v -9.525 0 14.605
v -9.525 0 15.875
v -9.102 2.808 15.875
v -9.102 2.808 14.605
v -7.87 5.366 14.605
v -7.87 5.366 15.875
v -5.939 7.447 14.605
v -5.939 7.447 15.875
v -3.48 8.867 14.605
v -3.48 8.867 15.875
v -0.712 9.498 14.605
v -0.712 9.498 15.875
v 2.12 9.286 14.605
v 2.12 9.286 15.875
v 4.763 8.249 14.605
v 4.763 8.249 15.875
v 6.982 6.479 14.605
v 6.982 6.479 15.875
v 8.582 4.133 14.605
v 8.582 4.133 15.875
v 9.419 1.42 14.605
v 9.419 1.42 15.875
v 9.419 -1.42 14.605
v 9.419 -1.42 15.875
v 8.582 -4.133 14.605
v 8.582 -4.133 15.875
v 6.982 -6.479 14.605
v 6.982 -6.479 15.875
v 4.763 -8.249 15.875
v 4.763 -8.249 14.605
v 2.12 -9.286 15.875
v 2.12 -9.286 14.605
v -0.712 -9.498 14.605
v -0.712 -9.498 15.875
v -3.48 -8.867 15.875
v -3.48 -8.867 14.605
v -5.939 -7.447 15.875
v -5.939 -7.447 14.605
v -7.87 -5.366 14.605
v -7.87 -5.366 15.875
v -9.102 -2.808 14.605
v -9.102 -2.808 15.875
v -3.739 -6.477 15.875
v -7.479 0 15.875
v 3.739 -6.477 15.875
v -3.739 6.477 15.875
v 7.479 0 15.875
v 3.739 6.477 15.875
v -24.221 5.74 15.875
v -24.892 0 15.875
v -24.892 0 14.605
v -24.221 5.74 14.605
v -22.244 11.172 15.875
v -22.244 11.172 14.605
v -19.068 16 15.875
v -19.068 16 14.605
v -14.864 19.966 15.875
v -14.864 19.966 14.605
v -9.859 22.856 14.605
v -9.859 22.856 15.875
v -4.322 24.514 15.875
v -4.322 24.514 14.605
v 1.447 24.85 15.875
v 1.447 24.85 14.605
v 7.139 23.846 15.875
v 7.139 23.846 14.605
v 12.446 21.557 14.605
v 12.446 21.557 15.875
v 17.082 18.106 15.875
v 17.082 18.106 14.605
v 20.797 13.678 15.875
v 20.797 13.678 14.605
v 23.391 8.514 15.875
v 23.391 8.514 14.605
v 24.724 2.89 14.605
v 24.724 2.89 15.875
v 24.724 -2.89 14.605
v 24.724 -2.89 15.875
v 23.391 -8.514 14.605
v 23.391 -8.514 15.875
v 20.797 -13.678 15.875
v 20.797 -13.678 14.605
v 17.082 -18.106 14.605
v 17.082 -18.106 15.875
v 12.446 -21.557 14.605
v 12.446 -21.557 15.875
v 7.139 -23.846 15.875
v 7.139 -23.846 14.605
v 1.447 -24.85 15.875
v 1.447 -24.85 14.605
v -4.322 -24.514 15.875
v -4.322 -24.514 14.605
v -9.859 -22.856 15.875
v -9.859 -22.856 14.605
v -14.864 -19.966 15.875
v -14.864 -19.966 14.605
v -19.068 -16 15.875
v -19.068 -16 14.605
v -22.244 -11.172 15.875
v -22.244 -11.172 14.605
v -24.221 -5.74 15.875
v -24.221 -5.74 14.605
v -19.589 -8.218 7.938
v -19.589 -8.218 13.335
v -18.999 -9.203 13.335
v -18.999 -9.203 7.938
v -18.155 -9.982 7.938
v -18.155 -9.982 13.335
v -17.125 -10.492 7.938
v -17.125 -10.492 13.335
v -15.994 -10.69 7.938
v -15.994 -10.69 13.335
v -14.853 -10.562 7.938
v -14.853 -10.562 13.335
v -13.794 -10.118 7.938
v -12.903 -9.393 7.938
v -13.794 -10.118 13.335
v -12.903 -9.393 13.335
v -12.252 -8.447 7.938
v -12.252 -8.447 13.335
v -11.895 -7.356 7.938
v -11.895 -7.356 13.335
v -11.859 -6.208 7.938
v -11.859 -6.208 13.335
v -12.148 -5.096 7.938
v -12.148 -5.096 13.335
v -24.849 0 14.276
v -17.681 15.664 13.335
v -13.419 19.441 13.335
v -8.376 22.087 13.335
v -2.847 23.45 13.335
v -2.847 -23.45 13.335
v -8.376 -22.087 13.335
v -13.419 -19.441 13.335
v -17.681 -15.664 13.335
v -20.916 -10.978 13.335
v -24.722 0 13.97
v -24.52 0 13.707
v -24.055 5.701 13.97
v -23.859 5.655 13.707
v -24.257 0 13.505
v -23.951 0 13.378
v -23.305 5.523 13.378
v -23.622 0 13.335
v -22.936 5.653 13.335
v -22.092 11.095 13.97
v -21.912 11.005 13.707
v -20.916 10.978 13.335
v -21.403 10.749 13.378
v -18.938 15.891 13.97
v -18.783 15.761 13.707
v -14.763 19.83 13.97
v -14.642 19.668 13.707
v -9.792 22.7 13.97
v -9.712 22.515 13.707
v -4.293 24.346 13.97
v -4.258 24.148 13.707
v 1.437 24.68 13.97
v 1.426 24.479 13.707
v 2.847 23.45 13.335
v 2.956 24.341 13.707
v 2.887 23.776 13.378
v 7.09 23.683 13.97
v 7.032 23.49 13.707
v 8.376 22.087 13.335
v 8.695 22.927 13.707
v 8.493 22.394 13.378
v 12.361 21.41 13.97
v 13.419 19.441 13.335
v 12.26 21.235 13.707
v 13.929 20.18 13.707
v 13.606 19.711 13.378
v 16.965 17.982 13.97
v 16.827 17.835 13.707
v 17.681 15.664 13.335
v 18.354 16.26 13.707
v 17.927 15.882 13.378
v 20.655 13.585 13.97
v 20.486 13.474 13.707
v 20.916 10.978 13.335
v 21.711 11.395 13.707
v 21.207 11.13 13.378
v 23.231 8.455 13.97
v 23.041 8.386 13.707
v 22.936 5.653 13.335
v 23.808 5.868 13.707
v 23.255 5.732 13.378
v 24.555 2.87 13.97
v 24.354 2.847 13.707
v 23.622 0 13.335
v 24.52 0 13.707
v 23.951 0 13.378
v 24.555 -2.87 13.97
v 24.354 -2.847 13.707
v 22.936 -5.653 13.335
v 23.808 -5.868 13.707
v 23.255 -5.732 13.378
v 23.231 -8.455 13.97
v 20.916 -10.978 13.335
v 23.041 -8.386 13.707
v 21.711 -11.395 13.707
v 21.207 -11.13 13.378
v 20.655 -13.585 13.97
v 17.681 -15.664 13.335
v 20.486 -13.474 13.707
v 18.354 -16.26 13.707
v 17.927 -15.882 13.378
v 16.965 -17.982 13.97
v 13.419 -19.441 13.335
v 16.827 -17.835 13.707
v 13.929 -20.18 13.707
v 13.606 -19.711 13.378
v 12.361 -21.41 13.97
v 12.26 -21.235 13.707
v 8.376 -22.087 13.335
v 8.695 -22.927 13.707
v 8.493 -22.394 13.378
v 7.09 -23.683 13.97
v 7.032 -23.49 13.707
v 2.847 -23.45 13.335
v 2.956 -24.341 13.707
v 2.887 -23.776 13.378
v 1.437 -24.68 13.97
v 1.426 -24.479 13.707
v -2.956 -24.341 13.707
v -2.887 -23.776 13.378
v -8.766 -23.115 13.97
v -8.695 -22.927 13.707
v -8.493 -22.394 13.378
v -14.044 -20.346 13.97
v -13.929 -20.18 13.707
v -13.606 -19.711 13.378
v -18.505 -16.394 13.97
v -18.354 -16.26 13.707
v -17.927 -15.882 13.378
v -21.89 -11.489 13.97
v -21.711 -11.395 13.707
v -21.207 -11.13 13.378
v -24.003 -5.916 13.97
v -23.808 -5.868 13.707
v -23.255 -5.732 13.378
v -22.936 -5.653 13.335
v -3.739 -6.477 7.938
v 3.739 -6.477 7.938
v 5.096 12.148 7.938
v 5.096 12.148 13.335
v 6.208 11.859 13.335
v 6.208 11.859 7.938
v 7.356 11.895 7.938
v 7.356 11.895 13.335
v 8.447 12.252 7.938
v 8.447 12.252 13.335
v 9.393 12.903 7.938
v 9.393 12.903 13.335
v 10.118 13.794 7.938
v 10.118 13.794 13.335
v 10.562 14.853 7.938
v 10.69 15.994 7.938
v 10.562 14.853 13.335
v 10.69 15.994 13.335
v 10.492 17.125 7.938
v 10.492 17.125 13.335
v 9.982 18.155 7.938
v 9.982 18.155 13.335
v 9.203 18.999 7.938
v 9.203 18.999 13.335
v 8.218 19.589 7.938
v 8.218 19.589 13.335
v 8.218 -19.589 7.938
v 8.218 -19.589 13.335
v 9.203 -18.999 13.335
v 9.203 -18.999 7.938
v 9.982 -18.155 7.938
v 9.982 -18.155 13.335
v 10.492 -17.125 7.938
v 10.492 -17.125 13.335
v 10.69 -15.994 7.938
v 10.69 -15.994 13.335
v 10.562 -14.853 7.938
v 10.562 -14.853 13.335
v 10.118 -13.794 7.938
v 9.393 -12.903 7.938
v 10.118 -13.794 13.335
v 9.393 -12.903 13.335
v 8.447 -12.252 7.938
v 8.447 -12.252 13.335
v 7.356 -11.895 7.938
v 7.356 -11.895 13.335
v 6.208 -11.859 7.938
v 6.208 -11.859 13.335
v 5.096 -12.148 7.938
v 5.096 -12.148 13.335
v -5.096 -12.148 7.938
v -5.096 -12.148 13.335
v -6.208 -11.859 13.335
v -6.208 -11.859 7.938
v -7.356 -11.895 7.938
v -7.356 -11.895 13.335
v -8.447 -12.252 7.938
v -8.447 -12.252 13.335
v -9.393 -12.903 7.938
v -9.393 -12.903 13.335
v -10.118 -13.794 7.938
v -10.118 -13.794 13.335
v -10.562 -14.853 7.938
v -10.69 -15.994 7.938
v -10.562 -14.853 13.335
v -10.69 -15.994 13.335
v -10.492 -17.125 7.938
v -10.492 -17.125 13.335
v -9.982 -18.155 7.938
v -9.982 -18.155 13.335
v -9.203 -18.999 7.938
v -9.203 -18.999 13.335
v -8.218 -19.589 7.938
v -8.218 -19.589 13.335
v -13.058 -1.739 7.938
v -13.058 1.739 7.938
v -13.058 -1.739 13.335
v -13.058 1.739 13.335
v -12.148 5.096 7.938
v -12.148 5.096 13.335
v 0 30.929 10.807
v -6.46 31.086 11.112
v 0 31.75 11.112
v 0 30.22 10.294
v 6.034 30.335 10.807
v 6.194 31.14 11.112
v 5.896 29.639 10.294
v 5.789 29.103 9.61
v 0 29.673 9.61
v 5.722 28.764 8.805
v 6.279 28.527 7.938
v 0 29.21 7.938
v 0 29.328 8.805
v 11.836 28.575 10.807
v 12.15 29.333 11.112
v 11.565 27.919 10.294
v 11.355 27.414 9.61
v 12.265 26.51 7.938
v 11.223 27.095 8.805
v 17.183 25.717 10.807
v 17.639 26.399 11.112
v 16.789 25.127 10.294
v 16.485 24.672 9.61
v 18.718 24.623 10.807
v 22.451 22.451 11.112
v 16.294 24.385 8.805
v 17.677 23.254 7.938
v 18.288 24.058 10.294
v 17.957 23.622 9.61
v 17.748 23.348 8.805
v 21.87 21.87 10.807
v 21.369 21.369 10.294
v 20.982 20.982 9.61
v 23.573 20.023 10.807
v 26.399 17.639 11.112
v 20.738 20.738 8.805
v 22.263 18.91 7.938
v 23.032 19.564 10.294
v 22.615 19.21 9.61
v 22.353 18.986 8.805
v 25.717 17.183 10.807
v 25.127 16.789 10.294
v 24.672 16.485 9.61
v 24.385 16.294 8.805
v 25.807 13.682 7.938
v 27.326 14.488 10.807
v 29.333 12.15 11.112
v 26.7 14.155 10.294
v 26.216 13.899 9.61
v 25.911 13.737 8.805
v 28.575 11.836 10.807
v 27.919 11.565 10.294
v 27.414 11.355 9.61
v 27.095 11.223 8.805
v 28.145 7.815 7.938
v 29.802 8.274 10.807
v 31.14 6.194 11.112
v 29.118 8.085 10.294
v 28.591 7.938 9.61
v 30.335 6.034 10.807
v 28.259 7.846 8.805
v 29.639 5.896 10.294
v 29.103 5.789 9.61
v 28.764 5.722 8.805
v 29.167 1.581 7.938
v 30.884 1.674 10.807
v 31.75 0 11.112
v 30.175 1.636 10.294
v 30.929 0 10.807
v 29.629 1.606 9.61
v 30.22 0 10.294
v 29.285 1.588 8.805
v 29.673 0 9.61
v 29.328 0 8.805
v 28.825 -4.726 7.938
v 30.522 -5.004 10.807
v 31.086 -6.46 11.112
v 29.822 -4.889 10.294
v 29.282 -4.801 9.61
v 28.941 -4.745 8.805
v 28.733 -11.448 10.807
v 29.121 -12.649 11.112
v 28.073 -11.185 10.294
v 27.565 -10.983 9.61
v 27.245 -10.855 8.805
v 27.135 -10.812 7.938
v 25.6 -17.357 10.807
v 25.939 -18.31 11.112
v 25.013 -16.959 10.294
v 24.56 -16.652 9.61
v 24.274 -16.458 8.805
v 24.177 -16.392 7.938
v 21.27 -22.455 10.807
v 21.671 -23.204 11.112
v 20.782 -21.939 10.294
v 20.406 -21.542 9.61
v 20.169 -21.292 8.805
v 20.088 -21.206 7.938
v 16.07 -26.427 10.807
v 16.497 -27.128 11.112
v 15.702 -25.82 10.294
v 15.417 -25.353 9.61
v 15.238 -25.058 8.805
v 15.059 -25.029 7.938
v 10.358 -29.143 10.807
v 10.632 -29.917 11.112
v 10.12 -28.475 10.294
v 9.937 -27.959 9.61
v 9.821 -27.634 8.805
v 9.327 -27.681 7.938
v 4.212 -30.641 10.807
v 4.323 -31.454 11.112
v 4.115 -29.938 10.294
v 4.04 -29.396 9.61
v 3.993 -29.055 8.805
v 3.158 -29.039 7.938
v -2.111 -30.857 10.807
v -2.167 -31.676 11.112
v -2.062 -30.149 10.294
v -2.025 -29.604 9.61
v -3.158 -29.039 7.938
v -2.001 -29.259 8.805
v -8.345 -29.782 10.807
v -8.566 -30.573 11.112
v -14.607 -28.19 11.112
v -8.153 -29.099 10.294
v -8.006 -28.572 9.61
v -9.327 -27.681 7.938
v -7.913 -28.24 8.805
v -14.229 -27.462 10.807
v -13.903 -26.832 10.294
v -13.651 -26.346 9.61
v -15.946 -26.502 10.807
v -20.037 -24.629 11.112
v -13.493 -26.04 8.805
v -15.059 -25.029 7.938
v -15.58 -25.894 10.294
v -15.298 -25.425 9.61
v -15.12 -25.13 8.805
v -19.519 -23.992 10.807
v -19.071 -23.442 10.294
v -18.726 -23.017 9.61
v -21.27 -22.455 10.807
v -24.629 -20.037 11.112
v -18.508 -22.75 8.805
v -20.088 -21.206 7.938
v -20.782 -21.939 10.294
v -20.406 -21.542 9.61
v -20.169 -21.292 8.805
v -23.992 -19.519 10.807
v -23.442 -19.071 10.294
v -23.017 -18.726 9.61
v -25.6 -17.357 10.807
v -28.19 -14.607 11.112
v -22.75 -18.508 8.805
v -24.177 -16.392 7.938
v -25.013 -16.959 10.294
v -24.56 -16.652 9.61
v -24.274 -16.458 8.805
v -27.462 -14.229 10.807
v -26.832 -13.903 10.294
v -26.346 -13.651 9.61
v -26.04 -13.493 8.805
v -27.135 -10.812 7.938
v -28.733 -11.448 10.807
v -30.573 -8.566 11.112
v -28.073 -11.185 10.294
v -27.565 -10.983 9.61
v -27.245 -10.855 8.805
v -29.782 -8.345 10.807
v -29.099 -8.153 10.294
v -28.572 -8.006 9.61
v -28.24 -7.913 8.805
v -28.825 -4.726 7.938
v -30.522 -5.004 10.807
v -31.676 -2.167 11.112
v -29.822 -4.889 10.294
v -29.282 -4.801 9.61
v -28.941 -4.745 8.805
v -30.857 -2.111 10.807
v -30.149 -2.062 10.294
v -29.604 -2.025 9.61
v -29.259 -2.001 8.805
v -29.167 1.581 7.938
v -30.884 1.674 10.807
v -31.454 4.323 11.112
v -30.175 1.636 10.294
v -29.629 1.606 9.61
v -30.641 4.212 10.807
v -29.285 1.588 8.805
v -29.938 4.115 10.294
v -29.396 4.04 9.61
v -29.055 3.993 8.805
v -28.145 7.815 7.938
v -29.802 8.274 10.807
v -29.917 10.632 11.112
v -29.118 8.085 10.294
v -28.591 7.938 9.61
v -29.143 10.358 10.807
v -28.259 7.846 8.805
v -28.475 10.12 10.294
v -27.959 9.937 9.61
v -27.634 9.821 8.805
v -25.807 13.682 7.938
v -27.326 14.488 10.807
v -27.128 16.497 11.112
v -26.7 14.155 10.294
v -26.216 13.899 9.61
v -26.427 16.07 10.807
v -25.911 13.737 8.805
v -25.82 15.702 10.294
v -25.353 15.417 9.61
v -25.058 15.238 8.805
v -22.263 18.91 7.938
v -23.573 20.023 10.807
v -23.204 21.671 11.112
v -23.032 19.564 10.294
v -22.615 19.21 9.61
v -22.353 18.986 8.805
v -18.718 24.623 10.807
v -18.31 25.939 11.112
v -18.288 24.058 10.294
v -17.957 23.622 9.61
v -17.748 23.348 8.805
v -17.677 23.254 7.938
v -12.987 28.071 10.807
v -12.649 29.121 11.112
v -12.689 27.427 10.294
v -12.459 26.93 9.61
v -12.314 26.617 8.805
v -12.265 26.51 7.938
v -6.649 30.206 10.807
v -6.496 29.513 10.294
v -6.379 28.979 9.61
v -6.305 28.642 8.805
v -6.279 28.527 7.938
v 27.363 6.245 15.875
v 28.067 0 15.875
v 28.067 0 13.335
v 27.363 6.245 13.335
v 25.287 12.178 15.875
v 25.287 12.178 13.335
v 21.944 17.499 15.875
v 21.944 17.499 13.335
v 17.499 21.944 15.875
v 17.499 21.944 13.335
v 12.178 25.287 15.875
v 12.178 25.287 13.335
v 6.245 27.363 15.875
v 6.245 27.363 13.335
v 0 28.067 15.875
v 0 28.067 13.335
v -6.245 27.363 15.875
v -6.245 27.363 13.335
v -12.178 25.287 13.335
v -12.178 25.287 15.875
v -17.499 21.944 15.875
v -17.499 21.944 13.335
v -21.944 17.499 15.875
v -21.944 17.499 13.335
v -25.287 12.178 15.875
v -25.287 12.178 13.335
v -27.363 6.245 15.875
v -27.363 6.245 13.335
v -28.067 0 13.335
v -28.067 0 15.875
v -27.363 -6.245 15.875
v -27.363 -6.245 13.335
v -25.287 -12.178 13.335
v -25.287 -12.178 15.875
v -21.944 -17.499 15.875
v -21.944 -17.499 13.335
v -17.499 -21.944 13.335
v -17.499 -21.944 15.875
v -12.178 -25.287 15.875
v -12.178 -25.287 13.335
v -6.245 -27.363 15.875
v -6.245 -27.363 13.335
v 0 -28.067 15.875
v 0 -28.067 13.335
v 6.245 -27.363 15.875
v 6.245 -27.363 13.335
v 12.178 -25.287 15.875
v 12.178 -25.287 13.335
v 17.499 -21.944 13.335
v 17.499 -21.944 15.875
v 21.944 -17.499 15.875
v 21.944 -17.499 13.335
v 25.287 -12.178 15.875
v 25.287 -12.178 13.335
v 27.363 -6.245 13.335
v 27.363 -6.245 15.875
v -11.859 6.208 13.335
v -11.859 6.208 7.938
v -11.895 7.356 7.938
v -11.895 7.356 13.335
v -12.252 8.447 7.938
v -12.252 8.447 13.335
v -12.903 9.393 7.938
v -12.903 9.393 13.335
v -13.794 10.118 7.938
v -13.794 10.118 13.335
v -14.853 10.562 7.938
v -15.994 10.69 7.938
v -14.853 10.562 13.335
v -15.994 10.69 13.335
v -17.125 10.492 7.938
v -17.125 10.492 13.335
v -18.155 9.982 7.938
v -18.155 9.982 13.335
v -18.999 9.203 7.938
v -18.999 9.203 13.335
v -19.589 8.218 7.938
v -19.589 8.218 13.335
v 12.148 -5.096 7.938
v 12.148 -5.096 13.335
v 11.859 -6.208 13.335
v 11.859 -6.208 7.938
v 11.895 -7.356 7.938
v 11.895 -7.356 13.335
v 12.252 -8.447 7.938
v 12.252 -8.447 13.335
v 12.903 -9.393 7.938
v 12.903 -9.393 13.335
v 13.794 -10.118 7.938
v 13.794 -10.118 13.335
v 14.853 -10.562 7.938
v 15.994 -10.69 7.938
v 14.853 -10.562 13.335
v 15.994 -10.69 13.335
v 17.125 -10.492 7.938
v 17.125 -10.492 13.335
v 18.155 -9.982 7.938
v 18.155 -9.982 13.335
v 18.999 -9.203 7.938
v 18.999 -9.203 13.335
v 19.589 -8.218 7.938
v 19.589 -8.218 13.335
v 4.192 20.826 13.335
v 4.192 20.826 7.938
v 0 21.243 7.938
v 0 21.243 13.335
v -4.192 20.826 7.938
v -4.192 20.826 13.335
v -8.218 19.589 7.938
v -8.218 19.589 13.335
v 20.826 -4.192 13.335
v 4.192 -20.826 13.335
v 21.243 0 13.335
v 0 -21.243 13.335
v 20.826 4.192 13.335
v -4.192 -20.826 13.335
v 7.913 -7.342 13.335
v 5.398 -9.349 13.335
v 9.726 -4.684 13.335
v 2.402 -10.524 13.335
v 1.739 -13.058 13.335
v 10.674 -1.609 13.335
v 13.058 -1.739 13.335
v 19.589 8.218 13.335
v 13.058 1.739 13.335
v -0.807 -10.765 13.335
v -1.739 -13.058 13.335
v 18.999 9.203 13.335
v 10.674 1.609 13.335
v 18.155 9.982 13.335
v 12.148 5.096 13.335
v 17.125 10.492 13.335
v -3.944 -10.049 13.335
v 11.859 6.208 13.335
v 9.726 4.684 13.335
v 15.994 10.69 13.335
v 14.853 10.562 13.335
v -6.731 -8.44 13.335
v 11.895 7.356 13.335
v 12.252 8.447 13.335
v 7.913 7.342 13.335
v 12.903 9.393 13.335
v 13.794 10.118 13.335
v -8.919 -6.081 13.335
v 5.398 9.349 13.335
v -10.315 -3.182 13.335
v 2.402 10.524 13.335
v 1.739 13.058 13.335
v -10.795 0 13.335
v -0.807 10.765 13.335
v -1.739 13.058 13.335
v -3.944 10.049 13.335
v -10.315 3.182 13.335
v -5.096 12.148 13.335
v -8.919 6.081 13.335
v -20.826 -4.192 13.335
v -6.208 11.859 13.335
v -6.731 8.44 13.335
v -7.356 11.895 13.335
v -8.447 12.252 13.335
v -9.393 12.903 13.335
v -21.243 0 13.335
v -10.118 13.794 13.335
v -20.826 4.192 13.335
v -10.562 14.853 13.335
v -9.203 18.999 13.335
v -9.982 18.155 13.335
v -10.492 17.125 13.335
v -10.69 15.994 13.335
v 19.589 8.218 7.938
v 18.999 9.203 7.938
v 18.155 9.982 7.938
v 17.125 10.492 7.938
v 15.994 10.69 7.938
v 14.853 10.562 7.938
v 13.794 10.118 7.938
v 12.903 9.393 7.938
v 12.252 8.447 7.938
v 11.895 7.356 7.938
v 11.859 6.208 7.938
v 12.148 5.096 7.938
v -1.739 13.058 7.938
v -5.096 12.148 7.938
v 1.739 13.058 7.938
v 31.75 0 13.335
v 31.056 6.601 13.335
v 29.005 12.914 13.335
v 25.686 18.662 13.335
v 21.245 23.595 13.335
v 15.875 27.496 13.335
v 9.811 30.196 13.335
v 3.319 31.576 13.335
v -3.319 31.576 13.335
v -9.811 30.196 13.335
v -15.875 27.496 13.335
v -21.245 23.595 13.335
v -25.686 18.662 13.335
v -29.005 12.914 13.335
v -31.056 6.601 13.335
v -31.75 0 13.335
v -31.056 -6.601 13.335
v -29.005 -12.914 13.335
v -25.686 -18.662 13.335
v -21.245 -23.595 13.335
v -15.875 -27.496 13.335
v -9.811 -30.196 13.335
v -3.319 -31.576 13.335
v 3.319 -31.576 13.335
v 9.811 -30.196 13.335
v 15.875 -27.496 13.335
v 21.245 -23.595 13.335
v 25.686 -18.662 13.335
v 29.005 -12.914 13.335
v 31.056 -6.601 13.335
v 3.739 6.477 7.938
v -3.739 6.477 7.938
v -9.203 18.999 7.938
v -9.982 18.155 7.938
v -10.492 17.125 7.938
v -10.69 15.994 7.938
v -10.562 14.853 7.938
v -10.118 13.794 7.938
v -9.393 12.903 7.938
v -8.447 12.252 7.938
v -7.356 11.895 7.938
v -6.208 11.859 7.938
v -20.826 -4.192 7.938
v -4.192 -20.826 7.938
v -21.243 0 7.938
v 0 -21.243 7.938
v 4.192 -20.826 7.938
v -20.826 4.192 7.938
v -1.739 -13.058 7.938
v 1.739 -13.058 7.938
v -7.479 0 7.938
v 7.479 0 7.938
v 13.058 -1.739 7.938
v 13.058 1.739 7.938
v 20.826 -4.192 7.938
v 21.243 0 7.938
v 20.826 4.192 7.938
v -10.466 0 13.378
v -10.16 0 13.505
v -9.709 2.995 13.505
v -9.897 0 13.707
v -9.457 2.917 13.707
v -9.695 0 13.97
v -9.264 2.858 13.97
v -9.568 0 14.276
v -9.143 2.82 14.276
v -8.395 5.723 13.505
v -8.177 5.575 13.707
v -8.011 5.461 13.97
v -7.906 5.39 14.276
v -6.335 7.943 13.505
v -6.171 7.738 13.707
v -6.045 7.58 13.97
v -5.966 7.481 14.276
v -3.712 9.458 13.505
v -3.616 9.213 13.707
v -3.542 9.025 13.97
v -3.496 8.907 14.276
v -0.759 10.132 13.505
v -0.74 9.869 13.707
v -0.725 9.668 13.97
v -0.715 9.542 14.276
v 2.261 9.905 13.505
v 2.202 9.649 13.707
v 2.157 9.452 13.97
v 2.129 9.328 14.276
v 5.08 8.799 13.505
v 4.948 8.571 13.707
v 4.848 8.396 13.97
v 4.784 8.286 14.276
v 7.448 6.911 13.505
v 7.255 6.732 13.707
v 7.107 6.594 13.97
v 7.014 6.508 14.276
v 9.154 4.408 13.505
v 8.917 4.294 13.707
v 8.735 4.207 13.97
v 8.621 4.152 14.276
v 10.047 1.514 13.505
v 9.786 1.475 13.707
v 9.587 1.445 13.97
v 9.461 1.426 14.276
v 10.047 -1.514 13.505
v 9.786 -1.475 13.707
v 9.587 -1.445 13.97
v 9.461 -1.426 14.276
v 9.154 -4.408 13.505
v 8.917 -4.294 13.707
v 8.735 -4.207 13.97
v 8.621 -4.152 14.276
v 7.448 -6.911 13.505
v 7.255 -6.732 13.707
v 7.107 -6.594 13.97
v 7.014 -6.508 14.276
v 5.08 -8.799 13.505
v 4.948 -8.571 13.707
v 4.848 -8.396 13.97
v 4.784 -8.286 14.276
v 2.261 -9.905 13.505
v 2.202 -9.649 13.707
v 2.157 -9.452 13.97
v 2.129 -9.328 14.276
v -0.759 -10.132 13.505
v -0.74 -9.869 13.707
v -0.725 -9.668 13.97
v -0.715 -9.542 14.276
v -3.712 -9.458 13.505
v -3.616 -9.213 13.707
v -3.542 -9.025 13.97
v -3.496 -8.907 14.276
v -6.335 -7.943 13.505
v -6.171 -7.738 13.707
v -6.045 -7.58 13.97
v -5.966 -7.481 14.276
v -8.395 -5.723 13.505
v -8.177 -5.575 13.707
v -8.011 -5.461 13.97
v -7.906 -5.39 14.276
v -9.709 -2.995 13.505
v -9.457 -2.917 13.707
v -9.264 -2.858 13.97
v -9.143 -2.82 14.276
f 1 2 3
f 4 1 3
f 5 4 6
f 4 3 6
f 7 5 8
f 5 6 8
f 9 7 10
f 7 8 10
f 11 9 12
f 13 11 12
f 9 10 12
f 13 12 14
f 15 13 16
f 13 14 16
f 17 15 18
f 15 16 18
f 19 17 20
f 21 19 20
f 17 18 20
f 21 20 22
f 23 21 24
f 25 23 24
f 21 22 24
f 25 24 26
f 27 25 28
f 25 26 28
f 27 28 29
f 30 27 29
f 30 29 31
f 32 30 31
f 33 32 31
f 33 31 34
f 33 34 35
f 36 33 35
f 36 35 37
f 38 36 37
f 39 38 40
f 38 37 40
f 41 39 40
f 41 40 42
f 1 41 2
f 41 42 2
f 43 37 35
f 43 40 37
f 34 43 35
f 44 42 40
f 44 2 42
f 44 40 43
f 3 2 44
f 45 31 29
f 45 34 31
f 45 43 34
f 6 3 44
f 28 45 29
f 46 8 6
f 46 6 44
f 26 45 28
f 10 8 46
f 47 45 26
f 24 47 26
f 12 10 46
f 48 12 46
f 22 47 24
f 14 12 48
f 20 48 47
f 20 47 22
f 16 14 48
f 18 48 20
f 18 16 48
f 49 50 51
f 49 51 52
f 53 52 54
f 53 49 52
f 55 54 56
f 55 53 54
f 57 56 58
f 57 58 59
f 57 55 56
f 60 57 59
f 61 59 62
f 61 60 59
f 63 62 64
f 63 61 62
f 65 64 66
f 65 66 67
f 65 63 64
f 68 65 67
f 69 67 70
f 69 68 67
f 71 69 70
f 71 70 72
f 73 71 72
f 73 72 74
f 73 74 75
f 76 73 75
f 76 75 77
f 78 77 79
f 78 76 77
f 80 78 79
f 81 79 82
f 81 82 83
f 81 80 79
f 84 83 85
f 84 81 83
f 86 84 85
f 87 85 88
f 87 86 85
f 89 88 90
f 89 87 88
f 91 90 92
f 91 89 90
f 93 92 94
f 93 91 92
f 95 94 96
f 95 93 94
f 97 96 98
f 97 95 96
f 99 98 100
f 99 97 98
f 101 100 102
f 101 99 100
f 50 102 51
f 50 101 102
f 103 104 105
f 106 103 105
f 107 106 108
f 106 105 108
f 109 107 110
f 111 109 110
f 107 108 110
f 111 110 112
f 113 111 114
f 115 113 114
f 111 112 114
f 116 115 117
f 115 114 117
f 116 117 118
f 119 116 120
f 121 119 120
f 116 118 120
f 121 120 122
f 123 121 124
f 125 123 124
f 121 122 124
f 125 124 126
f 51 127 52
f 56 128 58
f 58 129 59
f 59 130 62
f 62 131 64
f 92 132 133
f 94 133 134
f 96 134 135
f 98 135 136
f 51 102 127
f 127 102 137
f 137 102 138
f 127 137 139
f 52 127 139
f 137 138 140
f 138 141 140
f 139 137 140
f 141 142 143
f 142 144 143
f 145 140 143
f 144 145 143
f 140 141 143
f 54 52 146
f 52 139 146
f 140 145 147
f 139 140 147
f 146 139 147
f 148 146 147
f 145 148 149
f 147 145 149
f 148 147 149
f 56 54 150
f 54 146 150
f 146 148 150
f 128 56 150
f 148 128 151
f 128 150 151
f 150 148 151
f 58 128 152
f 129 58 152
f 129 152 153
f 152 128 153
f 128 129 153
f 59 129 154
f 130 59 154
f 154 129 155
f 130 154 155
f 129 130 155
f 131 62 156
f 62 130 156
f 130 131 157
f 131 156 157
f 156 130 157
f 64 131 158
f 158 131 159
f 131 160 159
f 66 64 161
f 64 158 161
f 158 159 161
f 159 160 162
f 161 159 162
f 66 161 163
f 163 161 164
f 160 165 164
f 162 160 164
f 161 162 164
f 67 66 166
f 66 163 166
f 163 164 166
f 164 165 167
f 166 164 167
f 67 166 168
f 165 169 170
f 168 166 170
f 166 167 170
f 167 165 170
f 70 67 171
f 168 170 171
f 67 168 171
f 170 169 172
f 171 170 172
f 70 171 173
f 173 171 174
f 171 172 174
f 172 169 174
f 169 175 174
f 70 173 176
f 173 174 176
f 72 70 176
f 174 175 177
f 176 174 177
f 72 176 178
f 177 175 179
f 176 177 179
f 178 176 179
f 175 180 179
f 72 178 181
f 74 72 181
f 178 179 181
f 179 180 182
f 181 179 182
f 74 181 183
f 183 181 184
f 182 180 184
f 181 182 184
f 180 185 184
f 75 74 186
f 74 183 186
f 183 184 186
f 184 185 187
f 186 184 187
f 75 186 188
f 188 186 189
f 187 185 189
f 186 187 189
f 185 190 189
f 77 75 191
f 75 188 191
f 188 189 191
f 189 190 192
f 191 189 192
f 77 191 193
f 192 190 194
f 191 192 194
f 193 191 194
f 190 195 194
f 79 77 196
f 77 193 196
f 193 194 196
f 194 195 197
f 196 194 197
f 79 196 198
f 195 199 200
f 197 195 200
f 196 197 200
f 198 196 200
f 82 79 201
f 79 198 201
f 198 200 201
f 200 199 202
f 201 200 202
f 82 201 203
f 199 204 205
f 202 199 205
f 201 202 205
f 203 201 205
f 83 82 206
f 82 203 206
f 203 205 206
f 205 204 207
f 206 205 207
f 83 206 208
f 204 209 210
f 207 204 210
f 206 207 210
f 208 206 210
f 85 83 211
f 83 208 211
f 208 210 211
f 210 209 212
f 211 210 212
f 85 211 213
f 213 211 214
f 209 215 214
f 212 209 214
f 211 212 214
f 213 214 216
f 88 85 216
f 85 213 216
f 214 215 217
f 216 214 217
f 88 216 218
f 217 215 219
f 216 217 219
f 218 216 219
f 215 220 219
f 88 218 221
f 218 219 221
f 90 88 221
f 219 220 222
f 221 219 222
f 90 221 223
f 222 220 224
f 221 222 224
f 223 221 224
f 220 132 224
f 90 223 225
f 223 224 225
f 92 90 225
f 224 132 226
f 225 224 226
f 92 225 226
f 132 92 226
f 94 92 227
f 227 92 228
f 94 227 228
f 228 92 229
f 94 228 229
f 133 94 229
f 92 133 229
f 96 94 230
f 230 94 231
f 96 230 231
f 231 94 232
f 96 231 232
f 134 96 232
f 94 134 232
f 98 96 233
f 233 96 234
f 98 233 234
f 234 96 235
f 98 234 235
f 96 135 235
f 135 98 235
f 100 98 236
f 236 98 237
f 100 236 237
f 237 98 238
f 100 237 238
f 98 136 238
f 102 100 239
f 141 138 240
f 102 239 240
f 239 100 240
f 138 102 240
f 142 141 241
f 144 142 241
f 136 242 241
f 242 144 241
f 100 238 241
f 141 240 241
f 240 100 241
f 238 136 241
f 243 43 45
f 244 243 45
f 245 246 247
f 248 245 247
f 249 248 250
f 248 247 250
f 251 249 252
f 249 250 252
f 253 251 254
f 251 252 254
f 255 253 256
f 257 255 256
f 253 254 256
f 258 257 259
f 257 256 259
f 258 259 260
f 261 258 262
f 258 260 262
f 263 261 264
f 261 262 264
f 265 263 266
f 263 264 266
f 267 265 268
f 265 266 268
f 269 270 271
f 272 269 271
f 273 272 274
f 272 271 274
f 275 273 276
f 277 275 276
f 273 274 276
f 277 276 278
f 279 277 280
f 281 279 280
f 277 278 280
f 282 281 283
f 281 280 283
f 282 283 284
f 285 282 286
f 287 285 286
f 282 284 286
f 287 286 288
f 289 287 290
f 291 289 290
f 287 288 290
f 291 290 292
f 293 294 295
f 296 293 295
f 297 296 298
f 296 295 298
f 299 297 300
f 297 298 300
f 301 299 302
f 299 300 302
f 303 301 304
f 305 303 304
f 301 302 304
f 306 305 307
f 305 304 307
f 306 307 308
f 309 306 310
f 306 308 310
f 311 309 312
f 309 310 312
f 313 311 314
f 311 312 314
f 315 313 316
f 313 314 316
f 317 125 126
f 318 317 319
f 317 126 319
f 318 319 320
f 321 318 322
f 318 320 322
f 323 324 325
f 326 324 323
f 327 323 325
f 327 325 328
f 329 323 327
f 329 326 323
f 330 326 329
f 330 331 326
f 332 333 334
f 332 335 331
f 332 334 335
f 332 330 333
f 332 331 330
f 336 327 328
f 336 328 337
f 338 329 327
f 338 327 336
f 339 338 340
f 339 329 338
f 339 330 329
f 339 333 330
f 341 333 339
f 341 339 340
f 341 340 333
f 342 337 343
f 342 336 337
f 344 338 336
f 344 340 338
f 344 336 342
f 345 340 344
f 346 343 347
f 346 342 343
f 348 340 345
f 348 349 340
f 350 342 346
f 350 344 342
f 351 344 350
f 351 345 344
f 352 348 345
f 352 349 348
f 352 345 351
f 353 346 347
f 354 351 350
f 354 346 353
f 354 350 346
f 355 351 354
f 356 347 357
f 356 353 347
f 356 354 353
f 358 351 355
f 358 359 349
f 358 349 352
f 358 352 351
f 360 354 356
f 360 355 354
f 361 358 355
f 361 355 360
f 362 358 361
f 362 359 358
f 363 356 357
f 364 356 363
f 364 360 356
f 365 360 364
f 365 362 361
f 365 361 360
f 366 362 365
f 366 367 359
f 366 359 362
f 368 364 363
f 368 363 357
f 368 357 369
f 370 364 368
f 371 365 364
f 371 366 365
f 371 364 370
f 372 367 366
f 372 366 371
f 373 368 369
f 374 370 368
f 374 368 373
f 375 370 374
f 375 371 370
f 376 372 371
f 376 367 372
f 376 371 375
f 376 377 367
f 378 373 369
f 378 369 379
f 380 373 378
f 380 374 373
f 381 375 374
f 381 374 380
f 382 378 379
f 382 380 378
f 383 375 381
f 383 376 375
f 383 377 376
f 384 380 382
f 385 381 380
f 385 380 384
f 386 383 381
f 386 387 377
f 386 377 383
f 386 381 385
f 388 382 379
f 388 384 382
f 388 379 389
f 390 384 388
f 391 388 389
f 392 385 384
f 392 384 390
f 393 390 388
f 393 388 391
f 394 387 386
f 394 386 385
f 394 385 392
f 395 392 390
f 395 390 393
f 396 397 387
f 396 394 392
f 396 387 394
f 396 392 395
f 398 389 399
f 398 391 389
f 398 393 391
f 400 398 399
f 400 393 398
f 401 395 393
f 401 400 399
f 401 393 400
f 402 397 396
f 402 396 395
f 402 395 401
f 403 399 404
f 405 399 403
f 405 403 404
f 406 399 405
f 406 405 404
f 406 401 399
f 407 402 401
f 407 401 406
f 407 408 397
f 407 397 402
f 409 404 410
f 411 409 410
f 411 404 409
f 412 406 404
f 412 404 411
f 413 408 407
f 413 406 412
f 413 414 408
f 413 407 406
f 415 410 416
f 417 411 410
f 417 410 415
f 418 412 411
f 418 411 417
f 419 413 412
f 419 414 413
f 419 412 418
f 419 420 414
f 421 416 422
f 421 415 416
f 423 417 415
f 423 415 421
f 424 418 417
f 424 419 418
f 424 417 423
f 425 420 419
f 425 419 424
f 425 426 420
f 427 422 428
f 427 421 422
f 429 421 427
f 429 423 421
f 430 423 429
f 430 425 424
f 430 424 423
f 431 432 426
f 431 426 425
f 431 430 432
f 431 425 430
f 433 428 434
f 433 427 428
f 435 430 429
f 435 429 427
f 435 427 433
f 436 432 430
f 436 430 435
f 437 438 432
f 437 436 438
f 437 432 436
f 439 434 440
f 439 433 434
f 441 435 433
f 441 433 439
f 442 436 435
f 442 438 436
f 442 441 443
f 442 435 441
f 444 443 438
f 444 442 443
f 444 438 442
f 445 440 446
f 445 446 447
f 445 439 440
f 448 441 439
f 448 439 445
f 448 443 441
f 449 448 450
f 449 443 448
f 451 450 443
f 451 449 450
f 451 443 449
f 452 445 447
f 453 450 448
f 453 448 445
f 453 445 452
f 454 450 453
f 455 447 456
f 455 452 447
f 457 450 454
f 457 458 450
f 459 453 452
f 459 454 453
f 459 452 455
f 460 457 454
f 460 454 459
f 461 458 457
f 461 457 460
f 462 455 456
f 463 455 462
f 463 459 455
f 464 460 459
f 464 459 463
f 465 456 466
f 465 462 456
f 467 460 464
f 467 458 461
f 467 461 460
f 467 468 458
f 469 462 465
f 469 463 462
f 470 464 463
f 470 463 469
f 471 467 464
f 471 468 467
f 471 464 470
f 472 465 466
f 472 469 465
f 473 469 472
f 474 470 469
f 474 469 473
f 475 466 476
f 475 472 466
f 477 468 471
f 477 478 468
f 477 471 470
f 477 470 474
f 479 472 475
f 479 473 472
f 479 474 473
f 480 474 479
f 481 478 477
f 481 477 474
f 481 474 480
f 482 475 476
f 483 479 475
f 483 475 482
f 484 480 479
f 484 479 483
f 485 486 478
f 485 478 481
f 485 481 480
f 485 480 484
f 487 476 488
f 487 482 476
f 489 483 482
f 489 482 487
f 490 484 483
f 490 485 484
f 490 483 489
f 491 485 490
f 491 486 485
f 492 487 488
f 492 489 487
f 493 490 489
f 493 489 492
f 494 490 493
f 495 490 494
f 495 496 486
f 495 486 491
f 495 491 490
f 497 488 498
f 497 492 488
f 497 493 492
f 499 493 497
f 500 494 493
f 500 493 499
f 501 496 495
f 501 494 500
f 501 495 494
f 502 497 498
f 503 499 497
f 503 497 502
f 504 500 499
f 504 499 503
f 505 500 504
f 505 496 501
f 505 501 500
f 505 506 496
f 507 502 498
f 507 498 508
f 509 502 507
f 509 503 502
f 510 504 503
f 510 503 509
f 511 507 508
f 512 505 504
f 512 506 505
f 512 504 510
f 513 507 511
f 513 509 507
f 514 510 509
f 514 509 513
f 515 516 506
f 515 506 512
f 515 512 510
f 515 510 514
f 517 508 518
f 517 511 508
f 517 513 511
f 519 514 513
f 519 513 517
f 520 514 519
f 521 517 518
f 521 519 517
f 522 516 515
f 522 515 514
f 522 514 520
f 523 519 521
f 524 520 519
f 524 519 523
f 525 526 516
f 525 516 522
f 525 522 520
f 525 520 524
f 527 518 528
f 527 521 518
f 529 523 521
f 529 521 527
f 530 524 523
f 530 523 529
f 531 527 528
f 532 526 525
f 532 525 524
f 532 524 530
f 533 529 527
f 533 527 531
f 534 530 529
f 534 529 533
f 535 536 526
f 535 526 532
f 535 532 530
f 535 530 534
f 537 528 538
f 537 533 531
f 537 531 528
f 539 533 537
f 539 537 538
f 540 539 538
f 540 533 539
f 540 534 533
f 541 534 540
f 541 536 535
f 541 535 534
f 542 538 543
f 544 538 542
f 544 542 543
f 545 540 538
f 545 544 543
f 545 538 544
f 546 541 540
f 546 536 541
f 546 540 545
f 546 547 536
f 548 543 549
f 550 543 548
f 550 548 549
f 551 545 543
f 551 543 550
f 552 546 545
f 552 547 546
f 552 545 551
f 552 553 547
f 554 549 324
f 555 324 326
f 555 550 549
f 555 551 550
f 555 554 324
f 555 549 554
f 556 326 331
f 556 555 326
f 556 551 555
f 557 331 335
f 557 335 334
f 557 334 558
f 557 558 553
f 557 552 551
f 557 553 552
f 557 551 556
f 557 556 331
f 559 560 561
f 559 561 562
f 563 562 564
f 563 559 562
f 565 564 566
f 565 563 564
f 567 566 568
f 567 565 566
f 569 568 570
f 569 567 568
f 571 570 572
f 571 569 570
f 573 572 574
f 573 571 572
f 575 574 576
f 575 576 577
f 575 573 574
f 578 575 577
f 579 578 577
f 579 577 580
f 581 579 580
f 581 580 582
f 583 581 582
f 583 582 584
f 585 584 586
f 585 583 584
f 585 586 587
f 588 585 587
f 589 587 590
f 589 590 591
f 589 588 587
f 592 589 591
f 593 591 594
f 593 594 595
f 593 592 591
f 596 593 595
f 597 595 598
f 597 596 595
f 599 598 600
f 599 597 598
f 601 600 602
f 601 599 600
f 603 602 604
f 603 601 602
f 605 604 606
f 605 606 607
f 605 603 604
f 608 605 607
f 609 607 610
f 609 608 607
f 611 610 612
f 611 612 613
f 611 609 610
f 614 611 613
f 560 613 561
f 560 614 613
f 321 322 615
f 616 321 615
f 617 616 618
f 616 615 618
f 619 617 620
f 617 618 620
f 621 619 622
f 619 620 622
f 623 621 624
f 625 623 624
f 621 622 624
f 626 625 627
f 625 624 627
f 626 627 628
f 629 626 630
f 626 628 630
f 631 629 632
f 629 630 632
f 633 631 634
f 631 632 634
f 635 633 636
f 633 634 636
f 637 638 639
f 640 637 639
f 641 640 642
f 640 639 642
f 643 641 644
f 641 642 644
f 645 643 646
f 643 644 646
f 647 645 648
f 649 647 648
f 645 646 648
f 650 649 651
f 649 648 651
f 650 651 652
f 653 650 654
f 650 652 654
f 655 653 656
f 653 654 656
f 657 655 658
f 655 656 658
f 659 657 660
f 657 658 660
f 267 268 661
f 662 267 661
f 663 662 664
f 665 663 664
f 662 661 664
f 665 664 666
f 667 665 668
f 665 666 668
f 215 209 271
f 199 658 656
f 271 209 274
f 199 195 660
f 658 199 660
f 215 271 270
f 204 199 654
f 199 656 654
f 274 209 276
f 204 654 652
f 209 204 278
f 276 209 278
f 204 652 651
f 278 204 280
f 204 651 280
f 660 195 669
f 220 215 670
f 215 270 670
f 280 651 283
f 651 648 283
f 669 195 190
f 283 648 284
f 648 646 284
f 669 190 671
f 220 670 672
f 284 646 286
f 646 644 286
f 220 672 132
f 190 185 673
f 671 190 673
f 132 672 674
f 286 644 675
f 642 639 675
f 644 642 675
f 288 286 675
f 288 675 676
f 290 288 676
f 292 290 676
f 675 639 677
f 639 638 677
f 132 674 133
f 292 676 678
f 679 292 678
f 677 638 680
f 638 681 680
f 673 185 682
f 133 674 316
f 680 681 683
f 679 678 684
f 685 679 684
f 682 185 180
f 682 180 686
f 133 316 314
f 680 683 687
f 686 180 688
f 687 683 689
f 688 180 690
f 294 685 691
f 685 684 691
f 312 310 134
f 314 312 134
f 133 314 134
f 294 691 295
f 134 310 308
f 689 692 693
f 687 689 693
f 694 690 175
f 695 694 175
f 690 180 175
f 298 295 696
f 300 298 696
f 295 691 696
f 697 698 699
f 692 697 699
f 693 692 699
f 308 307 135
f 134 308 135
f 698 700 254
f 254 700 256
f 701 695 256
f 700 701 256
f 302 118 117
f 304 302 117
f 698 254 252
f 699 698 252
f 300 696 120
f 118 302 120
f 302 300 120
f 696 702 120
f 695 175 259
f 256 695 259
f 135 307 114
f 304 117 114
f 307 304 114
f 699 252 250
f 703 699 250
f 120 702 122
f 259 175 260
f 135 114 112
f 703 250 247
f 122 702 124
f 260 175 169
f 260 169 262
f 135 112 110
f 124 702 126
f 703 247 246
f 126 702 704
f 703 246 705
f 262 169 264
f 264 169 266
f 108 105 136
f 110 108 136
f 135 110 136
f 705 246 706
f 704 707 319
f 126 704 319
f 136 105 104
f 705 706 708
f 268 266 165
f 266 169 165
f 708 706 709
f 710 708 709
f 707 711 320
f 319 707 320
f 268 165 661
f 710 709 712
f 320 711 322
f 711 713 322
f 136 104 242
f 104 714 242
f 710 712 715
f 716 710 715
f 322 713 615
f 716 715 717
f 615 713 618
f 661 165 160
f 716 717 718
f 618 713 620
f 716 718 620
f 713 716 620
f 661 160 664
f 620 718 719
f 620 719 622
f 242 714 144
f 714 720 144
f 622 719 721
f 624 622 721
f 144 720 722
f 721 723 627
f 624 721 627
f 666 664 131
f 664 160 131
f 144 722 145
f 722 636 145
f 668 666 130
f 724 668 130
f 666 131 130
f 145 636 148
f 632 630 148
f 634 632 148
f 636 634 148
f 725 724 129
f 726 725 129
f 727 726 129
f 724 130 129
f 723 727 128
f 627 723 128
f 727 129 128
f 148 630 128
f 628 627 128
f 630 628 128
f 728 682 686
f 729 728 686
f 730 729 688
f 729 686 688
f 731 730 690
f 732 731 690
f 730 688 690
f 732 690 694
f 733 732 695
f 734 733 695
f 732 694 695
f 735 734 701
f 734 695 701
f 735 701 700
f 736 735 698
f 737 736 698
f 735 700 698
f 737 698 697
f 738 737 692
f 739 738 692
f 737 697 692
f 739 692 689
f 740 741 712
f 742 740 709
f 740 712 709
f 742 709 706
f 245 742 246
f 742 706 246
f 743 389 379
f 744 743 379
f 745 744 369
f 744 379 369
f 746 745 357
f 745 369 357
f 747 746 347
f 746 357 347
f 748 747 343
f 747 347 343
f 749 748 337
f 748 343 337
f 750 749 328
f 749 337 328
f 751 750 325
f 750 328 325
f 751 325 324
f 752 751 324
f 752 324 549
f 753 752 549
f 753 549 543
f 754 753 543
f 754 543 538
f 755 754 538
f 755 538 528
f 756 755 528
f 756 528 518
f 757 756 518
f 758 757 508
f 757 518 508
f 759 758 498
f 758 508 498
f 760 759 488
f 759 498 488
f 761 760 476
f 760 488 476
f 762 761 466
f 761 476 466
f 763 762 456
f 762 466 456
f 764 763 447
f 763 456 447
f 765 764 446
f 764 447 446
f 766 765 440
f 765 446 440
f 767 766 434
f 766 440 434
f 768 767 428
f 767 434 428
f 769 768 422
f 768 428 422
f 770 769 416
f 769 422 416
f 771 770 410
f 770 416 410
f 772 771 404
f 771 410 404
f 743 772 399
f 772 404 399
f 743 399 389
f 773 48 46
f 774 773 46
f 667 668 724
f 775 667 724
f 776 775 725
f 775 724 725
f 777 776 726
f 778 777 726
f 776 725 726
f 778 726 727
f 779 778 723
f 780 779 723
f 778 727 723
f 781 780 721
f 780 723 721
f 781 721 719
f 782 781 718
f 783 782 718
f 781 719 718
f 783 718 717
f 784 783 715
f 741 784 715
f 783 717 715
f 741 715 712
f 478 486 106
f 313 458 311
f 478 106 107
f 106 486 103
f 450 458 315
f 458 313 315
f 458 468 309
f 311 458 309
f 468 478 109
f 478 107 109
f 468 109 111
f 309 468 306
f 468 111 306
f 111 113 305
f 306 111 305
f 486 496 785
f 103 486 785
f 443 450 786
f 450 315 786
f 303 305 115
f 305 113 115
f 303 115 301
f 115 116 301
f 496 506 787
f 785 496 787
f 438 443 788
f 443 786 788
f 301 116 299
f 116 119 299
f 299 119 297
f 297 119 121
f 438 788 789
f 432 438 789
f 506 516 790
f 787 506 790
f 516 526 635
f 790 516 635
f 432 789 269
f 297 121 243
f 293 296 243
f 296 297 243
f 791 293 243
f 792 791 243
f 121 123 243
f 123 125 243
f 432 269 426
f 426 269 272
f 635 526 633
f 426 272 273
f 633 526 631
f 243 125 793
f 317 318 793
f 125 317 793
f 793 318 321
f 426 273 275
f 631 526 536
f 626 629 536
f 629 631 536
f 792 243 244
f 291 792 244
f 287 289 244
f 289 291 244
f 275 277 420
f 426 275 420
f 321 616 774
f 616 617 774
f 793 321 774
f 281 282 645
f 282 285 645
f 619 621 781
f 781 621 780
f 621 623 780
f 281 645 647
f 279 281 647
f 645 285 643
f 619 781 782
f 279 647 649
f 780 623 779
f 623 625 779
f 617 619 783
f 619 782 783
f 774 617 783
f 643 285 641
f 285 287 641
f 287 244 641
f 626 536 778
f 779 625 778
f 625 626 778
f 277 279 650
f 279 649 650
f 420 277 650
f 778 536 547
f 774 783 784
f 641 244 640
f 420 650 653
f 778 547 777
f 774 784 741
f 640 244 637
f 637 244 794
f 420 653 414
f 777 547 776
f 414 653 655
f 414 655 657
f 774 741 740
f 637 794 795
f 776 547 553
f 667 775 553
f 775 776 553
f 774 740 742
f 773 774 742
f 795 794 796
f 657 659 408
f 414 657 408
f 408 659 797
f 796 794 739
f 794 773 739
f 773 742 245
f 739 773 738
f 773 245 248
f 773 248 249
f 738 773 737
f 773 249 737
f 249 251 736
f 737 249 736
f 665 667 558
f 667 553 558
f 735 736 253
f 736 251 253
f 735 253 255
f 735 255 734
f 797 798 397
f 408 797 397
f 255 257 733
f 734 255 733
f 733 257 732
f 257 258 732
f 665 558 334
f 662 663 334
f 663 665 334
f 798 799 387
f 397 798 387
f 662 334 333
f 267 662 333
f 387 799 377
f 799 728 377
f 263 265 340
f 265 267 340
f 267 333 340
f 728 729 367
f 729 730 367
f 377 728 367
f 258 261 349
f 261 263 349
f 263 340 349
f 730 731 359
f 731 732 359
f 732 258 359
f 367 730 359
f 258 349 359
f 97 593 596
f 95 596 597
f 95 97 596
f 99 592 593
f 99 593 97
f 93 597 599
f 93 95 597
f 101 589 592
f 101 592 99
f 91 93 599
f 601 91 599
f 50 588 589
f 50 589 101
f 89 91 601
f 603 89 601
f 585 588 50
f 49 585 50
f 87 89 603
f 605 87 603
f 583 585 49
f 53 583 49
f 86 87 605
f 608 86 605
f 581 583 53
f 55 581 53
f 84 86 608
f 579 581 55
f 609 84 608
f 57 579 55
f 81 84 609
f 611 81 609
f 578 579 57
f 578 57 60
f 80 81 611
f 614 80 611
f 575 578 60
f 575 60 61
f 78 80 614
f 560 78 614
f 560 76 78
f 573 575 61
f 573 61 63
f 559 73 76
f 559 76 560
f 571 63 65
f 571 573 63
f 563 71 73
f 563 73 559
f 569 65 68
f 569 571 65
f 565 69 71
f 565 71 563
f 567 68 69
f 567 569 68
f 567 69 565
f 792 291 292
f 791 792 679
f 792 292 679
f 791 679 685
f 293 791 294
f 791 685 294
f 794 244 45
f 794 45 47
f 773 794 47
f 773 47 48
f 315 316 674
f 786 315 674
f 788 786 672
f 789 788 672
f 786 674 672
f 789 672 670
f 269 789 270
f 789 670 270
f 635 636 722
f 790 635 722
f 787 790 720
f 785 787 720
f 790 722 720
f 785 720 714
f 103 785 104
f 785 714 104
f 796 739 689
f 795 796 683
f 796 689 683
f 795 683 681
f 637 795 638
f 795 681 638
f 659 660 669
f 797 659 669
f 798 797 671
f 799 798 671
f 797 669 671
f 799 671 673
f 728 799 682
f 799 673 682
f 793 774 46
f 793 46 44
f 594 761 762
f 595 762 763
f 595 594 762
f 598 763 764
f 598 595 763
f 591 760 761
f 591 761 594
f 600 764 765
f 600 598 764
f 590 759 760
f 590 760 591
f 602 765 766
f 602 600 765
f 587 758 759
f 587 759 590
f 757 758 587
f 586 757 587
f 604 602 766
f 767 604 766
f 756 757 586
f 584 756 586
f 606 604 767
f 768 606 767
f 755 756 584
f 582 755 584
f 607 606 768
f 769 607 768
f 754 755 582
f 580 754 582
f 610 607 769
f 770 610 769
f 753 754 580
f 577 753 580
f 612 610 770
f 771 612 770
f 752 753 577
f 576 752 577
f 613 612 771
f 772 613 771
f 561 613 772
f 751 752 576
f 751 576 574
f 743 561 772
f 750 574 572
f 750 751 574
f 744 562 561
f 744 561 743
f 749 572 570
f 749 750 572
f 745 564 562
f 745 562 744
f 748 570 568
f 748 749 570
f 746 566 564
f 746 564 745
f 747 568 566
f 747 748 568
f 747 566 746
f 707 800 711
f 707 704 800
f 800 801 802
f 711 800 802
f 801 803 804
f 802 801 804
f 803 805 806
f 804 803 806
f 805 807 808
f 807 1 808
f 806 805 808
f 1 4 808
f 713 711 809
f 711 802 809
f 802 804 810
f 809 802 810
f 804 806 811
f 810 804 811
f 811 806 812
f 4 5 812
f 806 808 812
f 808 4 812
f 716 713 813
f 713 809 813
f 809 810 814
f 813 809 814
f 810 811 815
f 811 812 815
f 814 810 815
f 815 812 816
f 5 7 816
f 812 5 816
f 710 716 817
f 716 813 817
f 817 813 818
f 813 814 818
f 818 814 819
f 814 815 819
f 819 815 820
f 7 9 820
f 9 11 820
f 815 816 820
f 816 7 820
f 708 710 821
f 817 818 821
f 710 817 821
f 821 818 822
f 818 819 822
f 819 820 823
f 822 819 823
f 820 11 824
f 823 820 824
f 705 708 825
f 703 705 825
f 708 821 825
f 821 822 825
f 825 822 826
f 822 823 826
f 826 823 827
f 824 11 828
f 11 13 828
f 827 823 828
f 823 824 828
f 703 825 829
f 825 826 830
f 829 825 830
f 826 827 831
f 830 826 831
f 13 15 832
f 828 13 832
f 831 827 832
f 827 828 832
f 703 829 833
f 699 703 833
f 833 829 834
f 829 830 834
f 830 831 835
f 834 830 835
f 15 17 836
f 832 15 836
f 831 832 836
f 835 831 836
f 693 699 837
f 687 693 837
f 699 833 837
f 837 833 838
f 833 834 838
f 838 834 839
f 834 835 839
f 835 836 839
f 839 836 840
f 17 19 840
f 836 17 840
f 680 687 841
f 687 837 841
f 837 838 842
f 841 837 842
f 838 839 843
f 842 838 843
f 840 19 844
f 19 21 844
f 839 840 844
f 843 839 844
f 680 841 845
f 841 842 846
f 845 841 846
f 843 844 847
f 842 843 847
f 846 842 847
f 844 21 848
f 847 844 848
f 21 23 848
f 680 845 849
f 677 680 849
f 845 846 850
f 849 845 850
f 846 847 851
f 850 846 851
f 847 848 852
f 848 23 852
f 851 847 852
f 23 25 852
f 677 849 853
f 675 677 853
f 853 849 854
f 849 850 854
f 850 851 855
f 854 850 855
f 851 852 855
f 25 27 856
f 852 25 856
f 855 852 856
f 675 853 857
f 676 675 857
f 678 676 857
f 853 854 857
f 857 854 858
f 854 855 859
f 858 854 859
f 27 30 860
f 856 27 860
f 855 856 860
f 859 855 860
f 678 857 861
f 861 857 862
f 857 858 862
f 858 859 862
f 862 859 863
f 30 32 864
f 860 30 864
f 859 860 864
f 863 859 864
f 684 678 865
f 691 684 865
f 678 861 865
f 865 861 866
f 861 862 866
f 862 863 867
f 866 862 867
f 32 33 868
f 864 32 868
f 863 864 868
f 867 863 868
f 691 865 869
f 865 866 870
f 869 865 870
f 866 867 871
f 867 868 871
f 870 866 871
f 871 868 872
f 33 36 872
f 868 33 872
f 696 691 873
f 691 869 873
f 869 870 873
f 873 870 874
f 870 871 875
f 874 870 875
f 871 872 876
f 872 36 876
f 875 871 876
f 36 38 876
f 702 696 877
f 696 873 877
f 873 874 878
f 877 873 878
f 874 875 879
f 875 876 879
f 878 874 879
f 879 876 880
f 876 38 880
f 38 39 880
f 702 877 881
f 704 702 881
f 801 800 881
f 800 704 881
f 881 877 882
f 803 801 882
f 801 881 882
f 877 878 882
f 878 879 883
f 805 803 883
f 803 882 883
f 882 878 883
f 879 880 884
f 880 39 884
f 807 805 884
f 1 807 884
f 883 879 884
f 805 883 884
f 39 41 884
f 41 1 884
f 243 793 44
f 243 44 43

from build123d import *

# Parameters (mm, degrees)
SKETCH1_R                         = 31.75
HEX_AXEL_CUTOUT_OUTSIDE_RIM_DEPTH = 15.875
SKETCH3_R                         = 31.75
SKETCH3_R_2                       = 28.067
PIPE_STEP_DEPTH                   = 2.54
SKETCH5_R                         = 24.892
SKETCH5_R_2                       = 9.525
SPOKE_STEP_DEPTH                  = 2.54
SLOTS_DEPTH                       = 14.335
FILLET1_R                         = 1.27
SKETCH7_W                         = 163.08703459
SKETCH7_H                         = 168.65885573
MIDCUT_DEPTH                      = 8.9375


with BuildPart() as part:
    # Sketch1 → Hex Axel Cutout & Outside Rim (new body)
    with BuildSketch(Plane.XY):
        Circle(SKETCH1_R)
        Polygon((-7.478995387, 0), (-3.739497694, -6.477), (3.739497694, -6.477), (7.478995387, 0), (3.739497694, 6.477), (-3.739497694, 6.477), align=None, mode=Mode.SUBTRACT)
    extrude(amount=HEX_AXEL_CUTOUT_OUTSIDE_RIM_DEPTH)

    # Sketch3 → Pipe Step (cut)
    with BuildSketch(Plane.XY.offset(15.875)):
        Circle(SKETCH3_R)
        Circle(SKETCH3_R_2, mode=Mode.SUBTRACT)
    pipe_step = extrude(amount=-PIPE_STEP_DEPTH, mode=Mode.SUBTRACT)

    # Step Mirror: Pipe Step across plane
    add(pipe_step.mirror(Plane.XY.offset(7.9375)), mode=Mode.SUBTRACT)

    # Sketch4 → Poly Cord Groove (revolve, cut)
    with BuildSketch(Plane(origin=(0, 0, 0), x_dir=(0, 0, -1), z_dir=(1, 0, 0))):
        with BuildLine():
            Line((-4.7625, 31.75), (-11.1125, 31.75))
            ThreePointArc((-11.1125, 31.75), (-7.9375, 29.21), (-4.7625, 31.75))
        make_face()
    revolve(axis=Axis((0, 0, 13.335), (0, 0, -1)), mode=Mode.SUBTRACT)

    # Sketch5 → Spoke Step (cut)
    with BuildSketch(Plane(origin=(0, 0, 0), x_dir=(-1, 0, 0), z_dir=(0, 0, -1))):
        Circle(SKETCH5_R)
        Circle(SKETCH5_R_2, mode=Mode.SUBTRACT)
    spoke_step = extrude(amount=-SPOKE_STEP_DEPTH, mode=Mode.SUBTRACT)

    # Spoke Step Mirror: Spoke Step across plane
    add(spoke_step.mirror(Plane.XY.offset(7.9375)), mode=Mode.SUBTRACT)

    # Sketch6 → Slots (cut, through all)
    with BuildSketch(Plane.XY.offset(13.335)):
        with BuildLine():
            ThreePointArc((19.589209778, -8.218410987), (21.243338223, 0), (19.589209778, 8.218410987))
            ThreePointArc((19.589209778, 8.218410987), (14.307589254, 10.378115507), (12.147884733, 5.096494983))
            ThreePointArc((12.147884733, 5.096494983), (13.173661777, 0), (12.147884733, -5.096494983))
            ThreePointArc((12.147884733, -5.096494983), (14.307589254, -10.378115507), (19.589209778, -8.218410987))
        make_face()
        with BuildLine():
            ThreePointArc((-8.218410987, -19.589209778), (0, -21.243338223), (8.218410987, -19.589209778))
            ThreePointArc((8.218410987, -19.589209778), (10.378115507, -14.307589254), (5.096494983, -12.147884733))
            ThreePointArc((5.096494983, -12.147884733), (0, -13.173661777), (-5.096494983, -12.147884733))
            ThreePointArc((-5.096494983, -12.147884733), (-10.378115507, -14.307589254), (-8.218410987, -19.589209778))
        make_face()
        with BuildLine():
            ThreePointArc((-19.589209778, 8.218410987), (-21.243338223, 0), (-19.589209778, -8.218410987))
            ThreePointArc((-19.589209778, -8.218410987), (-14.307589254, -10.378115507), (-12.147884733, -5.096494983))
            ThreePointArc((-12.147884733, -5.096494983), (-13.173661777, 0), (-12.147884733, 5.096494983))
            ThreePointArc((-12.147884733, 5.096494983), (-14.307589254, 10.378115507), (-19.589209778, 8.218410987))
        make_face()
        with BuildLine():
            ThreePointArc((8.218410987, 19.589209778), (0, 21.243338223), (-8.218410987, 19.589209778))
            ThreePointArc((-8.218410987, 19.589209778), (-10.378115507, 14.307589254), (-5.096494983, 12.147884733))
            ThreePointArc((-5.096494983, 12.147884733), (0, 13.173661777), (5.096494983, 12.147884733))
            ThreePointArc((5.096494983, 12.147884733), (10.378115507, 14.307589254), (8.218410987, 19.589209778))
        make_face()
    extrude(amount=-SLOTS_DEPTH, mode=Mode.SUBTRACT)

    # Fillet1
    fillet1_edges = [part.edges().sort_by_distance(p)[0] for p in [
        (24.892, 0, 2.54),
        (9.525, 0, 2.54),
        (24.892, 0, 13.335),
        (9.525, 0, 13.335),
    ]]
    fillet(fillet1_edges, radius=FILLET1_R)

    # Sketch7 → MidCut (cut, through all)
    with BuildSketch(Plane.XY.offset(7.9375)):
        with Locations((2.006221024, 3.627486548)):
            Rectangle(SKETCH7_W, SKETCH7_H)
    extrude(amount=-MIDCUT_DEPTH, mode=Mode.SUBTRACT)


solid = part.part
